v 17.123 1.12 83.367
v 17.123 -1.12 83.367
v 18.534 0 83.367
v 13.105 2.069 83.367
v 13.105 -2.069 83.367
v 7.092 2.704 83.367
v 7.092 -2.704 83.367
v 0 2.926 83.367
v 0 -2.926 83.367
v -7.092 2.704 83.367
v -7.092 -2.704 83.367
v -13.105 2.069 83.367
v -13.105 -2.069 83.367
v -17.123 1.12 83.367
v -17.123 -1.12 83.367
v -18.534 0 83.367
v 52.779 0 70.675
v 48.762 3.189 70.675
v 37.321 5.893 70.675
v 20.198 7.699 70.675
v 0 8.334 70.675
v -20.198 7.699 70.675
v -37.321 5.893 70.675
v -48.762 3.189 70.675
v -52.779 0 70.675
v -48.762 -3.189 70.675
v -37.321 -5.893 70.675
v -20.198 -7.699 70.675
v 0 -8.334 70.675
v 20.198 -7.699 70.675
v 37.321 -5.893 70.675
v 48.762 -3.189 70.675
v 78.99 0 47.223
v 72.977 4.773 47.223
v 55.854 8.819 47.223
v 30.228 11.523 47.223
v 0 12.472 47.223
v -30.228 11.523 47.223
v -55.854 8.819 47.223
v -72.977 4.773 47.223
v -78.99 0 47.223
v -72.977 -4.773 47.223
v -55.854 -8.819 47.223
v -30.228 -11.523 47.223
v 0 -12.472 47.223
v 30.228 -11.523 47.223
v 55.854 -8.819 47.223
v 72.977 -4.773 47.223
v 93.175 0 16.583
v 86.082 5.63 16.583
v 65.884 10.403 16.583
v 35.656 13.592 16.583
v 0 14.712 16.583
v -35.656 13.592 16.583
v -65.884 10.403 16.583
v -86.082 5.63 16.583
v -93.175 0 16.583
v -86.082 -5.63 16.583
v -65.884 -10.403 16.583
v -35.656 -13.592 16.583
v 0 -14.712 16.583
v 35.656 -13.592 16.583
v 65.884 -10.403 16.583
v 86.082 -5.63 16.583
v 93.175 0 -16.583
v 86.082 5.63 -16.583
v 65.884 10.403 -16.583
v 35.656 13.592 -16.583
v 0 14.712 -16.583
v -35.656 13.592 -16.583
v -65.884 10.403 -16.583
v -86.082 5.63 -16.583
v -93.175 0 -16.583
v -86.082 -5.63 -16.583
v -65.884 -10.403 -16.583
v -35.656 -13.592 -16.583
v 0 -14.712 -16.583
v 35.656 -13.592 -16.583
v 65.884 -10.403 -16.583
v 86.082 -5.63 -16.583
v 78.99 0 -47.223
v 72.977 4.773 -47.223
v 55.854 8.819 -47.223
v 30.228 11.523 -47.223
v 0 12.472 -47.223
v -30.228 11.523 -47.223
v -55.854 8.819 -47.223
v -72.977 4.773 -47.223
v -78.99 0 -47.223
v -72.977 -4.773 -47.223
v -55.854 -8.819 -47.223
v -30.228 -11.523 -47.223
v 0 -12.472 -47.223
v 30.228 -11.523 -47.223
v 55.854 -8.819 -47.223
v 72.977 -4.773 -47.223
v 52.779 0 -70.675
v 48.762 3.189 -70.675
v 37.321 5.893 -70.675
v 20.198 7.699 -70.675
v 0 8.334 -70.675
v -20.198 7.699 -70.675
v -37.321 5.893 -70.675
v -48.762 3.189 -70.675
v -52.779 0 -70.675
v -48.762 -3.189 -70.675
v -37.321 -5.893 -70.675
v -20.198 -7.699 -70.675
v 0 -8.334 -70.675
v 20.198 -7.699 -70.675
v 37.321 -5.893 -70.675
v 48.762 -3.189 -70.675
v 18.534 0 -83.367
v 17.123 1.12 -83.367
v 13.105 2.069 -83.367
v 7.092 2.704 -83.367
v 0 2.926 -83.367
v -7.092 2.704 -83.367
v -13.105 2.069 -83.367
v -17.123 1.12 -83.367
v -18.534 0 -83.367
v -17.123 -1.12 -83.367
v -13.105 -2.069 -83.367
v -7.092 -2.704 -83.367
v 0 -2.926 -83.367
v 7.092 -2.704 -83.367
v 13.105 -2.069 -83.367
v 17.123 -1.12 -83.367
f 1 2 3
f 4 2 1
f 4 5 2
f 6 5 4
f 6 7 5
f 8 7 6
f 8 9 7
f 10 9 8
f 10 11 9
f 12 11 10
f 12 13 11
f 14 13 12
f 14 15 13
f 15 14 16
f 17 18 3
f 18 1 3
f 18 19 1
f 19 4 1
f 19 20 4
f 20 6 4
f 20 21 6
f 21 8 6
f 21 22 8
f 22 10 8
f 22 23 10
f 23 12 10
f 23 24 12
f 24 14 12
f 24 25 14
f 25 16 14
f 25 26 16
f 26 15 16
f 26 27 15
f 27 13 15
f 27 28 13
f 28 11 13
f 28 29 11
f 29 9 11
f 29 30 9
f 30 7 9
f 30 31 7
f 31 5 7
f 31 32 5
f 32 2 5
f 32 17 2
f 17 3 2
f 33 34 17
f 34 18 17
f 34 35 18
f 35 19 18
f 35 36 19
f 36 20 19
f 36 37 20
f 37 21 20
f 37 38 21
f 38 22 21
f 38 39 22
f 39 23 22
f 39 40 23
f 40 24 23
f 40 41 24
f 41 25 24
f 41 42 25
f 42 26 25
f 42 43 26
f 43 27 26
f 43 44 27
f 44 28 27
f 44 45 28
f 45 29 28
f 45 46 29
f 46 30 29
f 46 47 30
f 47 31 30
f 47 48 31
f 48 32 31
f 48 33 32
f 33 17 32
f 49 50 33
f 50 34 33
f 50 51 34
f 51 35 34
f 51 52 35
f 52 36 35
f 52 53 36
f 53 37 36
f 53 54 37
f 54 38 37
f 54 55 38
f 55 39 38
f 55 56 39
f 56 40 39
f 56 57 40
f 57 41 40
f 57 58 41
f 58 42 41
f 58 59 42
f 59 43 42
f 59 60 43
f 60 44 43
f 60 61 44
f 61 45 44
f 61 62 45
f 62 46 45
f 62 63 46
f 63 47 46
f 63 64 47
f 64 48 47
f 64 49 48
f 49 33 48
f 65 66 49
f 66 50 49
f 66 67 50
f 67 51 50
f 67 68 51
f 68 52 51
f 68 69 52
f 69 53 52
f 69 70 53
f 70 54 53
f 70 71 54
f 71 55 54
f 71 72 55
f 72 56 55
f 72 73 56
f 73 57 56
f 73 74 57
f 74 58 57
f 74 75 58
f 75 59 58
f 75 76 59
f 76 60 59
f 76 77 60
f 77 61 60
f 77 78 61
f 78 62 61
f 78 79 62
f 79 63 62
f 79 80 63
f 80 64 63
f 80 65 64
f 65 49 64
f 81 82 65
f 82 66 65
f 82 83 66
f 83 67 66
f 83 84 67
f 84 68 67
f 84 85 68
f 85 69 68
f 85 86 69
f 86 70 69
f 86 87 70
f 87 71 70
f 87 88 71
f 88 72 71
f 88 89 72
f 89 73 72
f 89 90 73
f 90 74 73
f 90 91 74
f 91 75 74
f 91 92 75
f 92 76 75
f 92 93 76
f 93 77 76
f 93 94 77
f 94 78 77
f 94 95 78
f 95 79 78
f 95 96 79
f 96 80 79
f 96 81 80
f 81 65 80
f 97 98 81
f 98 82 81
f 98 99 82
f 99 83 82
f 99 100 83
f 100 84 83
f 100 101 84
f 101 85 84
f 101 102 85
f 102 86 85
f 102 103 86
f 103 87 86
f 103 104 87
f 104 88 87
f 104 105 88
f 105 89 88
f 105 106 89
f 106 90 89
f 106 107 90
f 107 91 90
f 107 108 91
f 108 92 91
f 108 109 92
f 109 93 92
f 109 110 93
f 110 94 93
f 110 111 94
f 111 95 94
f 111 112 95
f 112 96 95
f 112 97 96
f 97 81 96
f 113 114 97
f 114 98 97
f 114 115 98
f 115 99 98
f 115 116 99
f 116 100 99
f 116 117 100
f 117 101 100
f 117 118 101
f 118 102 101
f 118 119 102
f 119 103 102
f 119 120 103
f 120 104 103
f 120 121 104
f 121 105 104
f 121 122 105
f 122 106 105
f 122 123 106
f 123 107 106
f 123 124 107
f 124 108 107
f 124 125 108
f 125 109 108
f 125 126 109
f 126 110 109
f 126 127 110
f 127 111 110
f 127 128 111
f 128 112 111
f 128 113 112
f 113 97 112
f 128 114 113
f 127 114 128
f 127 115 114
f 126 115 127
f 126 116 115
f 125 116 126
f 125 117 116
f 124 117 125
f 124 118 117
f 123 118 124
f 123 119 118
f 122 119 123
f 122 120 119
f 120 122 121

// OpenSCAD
// Generated by SolidPython 1.0.1 on 2020-07-29 00:46:53


scale(v = [19, 3, 17]) {
	sphere(r = 5);
}
/***********************************************
*********      SolidPython code:      **********
************************************************
 
# import packages: SolidPython
from solid import *
from solid.utils import *
from itertools import chain, combinations, permutations


class Resize:

    def __init__(self, scad_file):
        self.scad_file = scad_file
        #self.scad_file = import_scad(scad_file)
        # cone/cylinder param:
        self.r1 = 0
        self.r2 = 0
        self.h = 0
        # rectangular prism param:
        self.w = 0
        self.l = 0
        # ellipse param:
        self.r = 0

    # import OpenScad code (file name corresponds to shape)


    # classify shape + parameters
    def assign(self, param1, param2, param3):
        if self.scad_file == 'cone.scad':
            self.r1 = param1
            self.r2 = param2
            self.h = param3
        elif self.scad_file == 'cylinder.scad':
            self.r1 = param1
            self.r2 = param2
            self.h = param3
        elif self.scad_file == 'rectangularPrism.scad':
            self.h = param1
            self.l = param2
            self.w = param3
        else:
            self.r = param1
            self.h = param2

    # resize parameters
    def iterate(self):
        x = range(3, 20, 2)
        i = 1
        if self.scad_file == 'cone.scad':
            tempList = list(permutations(x, 2))
            for temp in tempList:
                param1 = temp[0]
                param2 = temp[1]
                filepath = 'produced_scad_files/' + 'cone' + str(param1) + '_' + str(param2) + '_' + '.scad'
                scad_render_to_file(cylinder(h=param1, r1=param2, r2=0), filepath)

        elif self.scad_file == 'cylinder.scad':
            tempList = list(permutations(x, 3))
            for temp in tempList:
                param1 = temp[0]
                param2 = temp[1]
                filepath = 'produced_scad_files/' + 'cylinder' + str(param1) + '_' + str(param2) + '_' + '.scad'
                scad_render_to_file(cylinder(h=param1, r1=param2, r2=param2), filepath)

        elif self.scad_file == 'rectangularPrism.scad':
            tempList = list(permutations(x, 3))
            for temp in tempList:
                param1 = temp[0]
                param2 = temp[1]
                param3 = temp[2]
                filepath = 'produced_scad_files/' + 'rectangularPrism' + str(param1) + '_' + str(param2) + '_' + str(
                    param3) + '.scad'
                scad_render_to_file(cube(size=(param1, param2, param3)), filepath)

        elif self.scad_file == 'ellipse.scad':
            tempList = list(permutations(x, 4))
            for temp in tempList:
                param1 = temp[0]
                param2 = temp[1]
                param3 = temp[2]
                param4 = temp[3]
                filepath = 'produced_scad_files/' + 'ellipse' + str(param1) + '_' + str(param2) + '_' + str(param3) + '_' + str(param4) + '.scad'
                scad_render_to_file(scale([param1, param2, param3])(sphere(r=param4)), filepath)

    def render_to_scadfile(self):
        scad_render_to_file(scad, 'example.scad') 
 
************************************************/
